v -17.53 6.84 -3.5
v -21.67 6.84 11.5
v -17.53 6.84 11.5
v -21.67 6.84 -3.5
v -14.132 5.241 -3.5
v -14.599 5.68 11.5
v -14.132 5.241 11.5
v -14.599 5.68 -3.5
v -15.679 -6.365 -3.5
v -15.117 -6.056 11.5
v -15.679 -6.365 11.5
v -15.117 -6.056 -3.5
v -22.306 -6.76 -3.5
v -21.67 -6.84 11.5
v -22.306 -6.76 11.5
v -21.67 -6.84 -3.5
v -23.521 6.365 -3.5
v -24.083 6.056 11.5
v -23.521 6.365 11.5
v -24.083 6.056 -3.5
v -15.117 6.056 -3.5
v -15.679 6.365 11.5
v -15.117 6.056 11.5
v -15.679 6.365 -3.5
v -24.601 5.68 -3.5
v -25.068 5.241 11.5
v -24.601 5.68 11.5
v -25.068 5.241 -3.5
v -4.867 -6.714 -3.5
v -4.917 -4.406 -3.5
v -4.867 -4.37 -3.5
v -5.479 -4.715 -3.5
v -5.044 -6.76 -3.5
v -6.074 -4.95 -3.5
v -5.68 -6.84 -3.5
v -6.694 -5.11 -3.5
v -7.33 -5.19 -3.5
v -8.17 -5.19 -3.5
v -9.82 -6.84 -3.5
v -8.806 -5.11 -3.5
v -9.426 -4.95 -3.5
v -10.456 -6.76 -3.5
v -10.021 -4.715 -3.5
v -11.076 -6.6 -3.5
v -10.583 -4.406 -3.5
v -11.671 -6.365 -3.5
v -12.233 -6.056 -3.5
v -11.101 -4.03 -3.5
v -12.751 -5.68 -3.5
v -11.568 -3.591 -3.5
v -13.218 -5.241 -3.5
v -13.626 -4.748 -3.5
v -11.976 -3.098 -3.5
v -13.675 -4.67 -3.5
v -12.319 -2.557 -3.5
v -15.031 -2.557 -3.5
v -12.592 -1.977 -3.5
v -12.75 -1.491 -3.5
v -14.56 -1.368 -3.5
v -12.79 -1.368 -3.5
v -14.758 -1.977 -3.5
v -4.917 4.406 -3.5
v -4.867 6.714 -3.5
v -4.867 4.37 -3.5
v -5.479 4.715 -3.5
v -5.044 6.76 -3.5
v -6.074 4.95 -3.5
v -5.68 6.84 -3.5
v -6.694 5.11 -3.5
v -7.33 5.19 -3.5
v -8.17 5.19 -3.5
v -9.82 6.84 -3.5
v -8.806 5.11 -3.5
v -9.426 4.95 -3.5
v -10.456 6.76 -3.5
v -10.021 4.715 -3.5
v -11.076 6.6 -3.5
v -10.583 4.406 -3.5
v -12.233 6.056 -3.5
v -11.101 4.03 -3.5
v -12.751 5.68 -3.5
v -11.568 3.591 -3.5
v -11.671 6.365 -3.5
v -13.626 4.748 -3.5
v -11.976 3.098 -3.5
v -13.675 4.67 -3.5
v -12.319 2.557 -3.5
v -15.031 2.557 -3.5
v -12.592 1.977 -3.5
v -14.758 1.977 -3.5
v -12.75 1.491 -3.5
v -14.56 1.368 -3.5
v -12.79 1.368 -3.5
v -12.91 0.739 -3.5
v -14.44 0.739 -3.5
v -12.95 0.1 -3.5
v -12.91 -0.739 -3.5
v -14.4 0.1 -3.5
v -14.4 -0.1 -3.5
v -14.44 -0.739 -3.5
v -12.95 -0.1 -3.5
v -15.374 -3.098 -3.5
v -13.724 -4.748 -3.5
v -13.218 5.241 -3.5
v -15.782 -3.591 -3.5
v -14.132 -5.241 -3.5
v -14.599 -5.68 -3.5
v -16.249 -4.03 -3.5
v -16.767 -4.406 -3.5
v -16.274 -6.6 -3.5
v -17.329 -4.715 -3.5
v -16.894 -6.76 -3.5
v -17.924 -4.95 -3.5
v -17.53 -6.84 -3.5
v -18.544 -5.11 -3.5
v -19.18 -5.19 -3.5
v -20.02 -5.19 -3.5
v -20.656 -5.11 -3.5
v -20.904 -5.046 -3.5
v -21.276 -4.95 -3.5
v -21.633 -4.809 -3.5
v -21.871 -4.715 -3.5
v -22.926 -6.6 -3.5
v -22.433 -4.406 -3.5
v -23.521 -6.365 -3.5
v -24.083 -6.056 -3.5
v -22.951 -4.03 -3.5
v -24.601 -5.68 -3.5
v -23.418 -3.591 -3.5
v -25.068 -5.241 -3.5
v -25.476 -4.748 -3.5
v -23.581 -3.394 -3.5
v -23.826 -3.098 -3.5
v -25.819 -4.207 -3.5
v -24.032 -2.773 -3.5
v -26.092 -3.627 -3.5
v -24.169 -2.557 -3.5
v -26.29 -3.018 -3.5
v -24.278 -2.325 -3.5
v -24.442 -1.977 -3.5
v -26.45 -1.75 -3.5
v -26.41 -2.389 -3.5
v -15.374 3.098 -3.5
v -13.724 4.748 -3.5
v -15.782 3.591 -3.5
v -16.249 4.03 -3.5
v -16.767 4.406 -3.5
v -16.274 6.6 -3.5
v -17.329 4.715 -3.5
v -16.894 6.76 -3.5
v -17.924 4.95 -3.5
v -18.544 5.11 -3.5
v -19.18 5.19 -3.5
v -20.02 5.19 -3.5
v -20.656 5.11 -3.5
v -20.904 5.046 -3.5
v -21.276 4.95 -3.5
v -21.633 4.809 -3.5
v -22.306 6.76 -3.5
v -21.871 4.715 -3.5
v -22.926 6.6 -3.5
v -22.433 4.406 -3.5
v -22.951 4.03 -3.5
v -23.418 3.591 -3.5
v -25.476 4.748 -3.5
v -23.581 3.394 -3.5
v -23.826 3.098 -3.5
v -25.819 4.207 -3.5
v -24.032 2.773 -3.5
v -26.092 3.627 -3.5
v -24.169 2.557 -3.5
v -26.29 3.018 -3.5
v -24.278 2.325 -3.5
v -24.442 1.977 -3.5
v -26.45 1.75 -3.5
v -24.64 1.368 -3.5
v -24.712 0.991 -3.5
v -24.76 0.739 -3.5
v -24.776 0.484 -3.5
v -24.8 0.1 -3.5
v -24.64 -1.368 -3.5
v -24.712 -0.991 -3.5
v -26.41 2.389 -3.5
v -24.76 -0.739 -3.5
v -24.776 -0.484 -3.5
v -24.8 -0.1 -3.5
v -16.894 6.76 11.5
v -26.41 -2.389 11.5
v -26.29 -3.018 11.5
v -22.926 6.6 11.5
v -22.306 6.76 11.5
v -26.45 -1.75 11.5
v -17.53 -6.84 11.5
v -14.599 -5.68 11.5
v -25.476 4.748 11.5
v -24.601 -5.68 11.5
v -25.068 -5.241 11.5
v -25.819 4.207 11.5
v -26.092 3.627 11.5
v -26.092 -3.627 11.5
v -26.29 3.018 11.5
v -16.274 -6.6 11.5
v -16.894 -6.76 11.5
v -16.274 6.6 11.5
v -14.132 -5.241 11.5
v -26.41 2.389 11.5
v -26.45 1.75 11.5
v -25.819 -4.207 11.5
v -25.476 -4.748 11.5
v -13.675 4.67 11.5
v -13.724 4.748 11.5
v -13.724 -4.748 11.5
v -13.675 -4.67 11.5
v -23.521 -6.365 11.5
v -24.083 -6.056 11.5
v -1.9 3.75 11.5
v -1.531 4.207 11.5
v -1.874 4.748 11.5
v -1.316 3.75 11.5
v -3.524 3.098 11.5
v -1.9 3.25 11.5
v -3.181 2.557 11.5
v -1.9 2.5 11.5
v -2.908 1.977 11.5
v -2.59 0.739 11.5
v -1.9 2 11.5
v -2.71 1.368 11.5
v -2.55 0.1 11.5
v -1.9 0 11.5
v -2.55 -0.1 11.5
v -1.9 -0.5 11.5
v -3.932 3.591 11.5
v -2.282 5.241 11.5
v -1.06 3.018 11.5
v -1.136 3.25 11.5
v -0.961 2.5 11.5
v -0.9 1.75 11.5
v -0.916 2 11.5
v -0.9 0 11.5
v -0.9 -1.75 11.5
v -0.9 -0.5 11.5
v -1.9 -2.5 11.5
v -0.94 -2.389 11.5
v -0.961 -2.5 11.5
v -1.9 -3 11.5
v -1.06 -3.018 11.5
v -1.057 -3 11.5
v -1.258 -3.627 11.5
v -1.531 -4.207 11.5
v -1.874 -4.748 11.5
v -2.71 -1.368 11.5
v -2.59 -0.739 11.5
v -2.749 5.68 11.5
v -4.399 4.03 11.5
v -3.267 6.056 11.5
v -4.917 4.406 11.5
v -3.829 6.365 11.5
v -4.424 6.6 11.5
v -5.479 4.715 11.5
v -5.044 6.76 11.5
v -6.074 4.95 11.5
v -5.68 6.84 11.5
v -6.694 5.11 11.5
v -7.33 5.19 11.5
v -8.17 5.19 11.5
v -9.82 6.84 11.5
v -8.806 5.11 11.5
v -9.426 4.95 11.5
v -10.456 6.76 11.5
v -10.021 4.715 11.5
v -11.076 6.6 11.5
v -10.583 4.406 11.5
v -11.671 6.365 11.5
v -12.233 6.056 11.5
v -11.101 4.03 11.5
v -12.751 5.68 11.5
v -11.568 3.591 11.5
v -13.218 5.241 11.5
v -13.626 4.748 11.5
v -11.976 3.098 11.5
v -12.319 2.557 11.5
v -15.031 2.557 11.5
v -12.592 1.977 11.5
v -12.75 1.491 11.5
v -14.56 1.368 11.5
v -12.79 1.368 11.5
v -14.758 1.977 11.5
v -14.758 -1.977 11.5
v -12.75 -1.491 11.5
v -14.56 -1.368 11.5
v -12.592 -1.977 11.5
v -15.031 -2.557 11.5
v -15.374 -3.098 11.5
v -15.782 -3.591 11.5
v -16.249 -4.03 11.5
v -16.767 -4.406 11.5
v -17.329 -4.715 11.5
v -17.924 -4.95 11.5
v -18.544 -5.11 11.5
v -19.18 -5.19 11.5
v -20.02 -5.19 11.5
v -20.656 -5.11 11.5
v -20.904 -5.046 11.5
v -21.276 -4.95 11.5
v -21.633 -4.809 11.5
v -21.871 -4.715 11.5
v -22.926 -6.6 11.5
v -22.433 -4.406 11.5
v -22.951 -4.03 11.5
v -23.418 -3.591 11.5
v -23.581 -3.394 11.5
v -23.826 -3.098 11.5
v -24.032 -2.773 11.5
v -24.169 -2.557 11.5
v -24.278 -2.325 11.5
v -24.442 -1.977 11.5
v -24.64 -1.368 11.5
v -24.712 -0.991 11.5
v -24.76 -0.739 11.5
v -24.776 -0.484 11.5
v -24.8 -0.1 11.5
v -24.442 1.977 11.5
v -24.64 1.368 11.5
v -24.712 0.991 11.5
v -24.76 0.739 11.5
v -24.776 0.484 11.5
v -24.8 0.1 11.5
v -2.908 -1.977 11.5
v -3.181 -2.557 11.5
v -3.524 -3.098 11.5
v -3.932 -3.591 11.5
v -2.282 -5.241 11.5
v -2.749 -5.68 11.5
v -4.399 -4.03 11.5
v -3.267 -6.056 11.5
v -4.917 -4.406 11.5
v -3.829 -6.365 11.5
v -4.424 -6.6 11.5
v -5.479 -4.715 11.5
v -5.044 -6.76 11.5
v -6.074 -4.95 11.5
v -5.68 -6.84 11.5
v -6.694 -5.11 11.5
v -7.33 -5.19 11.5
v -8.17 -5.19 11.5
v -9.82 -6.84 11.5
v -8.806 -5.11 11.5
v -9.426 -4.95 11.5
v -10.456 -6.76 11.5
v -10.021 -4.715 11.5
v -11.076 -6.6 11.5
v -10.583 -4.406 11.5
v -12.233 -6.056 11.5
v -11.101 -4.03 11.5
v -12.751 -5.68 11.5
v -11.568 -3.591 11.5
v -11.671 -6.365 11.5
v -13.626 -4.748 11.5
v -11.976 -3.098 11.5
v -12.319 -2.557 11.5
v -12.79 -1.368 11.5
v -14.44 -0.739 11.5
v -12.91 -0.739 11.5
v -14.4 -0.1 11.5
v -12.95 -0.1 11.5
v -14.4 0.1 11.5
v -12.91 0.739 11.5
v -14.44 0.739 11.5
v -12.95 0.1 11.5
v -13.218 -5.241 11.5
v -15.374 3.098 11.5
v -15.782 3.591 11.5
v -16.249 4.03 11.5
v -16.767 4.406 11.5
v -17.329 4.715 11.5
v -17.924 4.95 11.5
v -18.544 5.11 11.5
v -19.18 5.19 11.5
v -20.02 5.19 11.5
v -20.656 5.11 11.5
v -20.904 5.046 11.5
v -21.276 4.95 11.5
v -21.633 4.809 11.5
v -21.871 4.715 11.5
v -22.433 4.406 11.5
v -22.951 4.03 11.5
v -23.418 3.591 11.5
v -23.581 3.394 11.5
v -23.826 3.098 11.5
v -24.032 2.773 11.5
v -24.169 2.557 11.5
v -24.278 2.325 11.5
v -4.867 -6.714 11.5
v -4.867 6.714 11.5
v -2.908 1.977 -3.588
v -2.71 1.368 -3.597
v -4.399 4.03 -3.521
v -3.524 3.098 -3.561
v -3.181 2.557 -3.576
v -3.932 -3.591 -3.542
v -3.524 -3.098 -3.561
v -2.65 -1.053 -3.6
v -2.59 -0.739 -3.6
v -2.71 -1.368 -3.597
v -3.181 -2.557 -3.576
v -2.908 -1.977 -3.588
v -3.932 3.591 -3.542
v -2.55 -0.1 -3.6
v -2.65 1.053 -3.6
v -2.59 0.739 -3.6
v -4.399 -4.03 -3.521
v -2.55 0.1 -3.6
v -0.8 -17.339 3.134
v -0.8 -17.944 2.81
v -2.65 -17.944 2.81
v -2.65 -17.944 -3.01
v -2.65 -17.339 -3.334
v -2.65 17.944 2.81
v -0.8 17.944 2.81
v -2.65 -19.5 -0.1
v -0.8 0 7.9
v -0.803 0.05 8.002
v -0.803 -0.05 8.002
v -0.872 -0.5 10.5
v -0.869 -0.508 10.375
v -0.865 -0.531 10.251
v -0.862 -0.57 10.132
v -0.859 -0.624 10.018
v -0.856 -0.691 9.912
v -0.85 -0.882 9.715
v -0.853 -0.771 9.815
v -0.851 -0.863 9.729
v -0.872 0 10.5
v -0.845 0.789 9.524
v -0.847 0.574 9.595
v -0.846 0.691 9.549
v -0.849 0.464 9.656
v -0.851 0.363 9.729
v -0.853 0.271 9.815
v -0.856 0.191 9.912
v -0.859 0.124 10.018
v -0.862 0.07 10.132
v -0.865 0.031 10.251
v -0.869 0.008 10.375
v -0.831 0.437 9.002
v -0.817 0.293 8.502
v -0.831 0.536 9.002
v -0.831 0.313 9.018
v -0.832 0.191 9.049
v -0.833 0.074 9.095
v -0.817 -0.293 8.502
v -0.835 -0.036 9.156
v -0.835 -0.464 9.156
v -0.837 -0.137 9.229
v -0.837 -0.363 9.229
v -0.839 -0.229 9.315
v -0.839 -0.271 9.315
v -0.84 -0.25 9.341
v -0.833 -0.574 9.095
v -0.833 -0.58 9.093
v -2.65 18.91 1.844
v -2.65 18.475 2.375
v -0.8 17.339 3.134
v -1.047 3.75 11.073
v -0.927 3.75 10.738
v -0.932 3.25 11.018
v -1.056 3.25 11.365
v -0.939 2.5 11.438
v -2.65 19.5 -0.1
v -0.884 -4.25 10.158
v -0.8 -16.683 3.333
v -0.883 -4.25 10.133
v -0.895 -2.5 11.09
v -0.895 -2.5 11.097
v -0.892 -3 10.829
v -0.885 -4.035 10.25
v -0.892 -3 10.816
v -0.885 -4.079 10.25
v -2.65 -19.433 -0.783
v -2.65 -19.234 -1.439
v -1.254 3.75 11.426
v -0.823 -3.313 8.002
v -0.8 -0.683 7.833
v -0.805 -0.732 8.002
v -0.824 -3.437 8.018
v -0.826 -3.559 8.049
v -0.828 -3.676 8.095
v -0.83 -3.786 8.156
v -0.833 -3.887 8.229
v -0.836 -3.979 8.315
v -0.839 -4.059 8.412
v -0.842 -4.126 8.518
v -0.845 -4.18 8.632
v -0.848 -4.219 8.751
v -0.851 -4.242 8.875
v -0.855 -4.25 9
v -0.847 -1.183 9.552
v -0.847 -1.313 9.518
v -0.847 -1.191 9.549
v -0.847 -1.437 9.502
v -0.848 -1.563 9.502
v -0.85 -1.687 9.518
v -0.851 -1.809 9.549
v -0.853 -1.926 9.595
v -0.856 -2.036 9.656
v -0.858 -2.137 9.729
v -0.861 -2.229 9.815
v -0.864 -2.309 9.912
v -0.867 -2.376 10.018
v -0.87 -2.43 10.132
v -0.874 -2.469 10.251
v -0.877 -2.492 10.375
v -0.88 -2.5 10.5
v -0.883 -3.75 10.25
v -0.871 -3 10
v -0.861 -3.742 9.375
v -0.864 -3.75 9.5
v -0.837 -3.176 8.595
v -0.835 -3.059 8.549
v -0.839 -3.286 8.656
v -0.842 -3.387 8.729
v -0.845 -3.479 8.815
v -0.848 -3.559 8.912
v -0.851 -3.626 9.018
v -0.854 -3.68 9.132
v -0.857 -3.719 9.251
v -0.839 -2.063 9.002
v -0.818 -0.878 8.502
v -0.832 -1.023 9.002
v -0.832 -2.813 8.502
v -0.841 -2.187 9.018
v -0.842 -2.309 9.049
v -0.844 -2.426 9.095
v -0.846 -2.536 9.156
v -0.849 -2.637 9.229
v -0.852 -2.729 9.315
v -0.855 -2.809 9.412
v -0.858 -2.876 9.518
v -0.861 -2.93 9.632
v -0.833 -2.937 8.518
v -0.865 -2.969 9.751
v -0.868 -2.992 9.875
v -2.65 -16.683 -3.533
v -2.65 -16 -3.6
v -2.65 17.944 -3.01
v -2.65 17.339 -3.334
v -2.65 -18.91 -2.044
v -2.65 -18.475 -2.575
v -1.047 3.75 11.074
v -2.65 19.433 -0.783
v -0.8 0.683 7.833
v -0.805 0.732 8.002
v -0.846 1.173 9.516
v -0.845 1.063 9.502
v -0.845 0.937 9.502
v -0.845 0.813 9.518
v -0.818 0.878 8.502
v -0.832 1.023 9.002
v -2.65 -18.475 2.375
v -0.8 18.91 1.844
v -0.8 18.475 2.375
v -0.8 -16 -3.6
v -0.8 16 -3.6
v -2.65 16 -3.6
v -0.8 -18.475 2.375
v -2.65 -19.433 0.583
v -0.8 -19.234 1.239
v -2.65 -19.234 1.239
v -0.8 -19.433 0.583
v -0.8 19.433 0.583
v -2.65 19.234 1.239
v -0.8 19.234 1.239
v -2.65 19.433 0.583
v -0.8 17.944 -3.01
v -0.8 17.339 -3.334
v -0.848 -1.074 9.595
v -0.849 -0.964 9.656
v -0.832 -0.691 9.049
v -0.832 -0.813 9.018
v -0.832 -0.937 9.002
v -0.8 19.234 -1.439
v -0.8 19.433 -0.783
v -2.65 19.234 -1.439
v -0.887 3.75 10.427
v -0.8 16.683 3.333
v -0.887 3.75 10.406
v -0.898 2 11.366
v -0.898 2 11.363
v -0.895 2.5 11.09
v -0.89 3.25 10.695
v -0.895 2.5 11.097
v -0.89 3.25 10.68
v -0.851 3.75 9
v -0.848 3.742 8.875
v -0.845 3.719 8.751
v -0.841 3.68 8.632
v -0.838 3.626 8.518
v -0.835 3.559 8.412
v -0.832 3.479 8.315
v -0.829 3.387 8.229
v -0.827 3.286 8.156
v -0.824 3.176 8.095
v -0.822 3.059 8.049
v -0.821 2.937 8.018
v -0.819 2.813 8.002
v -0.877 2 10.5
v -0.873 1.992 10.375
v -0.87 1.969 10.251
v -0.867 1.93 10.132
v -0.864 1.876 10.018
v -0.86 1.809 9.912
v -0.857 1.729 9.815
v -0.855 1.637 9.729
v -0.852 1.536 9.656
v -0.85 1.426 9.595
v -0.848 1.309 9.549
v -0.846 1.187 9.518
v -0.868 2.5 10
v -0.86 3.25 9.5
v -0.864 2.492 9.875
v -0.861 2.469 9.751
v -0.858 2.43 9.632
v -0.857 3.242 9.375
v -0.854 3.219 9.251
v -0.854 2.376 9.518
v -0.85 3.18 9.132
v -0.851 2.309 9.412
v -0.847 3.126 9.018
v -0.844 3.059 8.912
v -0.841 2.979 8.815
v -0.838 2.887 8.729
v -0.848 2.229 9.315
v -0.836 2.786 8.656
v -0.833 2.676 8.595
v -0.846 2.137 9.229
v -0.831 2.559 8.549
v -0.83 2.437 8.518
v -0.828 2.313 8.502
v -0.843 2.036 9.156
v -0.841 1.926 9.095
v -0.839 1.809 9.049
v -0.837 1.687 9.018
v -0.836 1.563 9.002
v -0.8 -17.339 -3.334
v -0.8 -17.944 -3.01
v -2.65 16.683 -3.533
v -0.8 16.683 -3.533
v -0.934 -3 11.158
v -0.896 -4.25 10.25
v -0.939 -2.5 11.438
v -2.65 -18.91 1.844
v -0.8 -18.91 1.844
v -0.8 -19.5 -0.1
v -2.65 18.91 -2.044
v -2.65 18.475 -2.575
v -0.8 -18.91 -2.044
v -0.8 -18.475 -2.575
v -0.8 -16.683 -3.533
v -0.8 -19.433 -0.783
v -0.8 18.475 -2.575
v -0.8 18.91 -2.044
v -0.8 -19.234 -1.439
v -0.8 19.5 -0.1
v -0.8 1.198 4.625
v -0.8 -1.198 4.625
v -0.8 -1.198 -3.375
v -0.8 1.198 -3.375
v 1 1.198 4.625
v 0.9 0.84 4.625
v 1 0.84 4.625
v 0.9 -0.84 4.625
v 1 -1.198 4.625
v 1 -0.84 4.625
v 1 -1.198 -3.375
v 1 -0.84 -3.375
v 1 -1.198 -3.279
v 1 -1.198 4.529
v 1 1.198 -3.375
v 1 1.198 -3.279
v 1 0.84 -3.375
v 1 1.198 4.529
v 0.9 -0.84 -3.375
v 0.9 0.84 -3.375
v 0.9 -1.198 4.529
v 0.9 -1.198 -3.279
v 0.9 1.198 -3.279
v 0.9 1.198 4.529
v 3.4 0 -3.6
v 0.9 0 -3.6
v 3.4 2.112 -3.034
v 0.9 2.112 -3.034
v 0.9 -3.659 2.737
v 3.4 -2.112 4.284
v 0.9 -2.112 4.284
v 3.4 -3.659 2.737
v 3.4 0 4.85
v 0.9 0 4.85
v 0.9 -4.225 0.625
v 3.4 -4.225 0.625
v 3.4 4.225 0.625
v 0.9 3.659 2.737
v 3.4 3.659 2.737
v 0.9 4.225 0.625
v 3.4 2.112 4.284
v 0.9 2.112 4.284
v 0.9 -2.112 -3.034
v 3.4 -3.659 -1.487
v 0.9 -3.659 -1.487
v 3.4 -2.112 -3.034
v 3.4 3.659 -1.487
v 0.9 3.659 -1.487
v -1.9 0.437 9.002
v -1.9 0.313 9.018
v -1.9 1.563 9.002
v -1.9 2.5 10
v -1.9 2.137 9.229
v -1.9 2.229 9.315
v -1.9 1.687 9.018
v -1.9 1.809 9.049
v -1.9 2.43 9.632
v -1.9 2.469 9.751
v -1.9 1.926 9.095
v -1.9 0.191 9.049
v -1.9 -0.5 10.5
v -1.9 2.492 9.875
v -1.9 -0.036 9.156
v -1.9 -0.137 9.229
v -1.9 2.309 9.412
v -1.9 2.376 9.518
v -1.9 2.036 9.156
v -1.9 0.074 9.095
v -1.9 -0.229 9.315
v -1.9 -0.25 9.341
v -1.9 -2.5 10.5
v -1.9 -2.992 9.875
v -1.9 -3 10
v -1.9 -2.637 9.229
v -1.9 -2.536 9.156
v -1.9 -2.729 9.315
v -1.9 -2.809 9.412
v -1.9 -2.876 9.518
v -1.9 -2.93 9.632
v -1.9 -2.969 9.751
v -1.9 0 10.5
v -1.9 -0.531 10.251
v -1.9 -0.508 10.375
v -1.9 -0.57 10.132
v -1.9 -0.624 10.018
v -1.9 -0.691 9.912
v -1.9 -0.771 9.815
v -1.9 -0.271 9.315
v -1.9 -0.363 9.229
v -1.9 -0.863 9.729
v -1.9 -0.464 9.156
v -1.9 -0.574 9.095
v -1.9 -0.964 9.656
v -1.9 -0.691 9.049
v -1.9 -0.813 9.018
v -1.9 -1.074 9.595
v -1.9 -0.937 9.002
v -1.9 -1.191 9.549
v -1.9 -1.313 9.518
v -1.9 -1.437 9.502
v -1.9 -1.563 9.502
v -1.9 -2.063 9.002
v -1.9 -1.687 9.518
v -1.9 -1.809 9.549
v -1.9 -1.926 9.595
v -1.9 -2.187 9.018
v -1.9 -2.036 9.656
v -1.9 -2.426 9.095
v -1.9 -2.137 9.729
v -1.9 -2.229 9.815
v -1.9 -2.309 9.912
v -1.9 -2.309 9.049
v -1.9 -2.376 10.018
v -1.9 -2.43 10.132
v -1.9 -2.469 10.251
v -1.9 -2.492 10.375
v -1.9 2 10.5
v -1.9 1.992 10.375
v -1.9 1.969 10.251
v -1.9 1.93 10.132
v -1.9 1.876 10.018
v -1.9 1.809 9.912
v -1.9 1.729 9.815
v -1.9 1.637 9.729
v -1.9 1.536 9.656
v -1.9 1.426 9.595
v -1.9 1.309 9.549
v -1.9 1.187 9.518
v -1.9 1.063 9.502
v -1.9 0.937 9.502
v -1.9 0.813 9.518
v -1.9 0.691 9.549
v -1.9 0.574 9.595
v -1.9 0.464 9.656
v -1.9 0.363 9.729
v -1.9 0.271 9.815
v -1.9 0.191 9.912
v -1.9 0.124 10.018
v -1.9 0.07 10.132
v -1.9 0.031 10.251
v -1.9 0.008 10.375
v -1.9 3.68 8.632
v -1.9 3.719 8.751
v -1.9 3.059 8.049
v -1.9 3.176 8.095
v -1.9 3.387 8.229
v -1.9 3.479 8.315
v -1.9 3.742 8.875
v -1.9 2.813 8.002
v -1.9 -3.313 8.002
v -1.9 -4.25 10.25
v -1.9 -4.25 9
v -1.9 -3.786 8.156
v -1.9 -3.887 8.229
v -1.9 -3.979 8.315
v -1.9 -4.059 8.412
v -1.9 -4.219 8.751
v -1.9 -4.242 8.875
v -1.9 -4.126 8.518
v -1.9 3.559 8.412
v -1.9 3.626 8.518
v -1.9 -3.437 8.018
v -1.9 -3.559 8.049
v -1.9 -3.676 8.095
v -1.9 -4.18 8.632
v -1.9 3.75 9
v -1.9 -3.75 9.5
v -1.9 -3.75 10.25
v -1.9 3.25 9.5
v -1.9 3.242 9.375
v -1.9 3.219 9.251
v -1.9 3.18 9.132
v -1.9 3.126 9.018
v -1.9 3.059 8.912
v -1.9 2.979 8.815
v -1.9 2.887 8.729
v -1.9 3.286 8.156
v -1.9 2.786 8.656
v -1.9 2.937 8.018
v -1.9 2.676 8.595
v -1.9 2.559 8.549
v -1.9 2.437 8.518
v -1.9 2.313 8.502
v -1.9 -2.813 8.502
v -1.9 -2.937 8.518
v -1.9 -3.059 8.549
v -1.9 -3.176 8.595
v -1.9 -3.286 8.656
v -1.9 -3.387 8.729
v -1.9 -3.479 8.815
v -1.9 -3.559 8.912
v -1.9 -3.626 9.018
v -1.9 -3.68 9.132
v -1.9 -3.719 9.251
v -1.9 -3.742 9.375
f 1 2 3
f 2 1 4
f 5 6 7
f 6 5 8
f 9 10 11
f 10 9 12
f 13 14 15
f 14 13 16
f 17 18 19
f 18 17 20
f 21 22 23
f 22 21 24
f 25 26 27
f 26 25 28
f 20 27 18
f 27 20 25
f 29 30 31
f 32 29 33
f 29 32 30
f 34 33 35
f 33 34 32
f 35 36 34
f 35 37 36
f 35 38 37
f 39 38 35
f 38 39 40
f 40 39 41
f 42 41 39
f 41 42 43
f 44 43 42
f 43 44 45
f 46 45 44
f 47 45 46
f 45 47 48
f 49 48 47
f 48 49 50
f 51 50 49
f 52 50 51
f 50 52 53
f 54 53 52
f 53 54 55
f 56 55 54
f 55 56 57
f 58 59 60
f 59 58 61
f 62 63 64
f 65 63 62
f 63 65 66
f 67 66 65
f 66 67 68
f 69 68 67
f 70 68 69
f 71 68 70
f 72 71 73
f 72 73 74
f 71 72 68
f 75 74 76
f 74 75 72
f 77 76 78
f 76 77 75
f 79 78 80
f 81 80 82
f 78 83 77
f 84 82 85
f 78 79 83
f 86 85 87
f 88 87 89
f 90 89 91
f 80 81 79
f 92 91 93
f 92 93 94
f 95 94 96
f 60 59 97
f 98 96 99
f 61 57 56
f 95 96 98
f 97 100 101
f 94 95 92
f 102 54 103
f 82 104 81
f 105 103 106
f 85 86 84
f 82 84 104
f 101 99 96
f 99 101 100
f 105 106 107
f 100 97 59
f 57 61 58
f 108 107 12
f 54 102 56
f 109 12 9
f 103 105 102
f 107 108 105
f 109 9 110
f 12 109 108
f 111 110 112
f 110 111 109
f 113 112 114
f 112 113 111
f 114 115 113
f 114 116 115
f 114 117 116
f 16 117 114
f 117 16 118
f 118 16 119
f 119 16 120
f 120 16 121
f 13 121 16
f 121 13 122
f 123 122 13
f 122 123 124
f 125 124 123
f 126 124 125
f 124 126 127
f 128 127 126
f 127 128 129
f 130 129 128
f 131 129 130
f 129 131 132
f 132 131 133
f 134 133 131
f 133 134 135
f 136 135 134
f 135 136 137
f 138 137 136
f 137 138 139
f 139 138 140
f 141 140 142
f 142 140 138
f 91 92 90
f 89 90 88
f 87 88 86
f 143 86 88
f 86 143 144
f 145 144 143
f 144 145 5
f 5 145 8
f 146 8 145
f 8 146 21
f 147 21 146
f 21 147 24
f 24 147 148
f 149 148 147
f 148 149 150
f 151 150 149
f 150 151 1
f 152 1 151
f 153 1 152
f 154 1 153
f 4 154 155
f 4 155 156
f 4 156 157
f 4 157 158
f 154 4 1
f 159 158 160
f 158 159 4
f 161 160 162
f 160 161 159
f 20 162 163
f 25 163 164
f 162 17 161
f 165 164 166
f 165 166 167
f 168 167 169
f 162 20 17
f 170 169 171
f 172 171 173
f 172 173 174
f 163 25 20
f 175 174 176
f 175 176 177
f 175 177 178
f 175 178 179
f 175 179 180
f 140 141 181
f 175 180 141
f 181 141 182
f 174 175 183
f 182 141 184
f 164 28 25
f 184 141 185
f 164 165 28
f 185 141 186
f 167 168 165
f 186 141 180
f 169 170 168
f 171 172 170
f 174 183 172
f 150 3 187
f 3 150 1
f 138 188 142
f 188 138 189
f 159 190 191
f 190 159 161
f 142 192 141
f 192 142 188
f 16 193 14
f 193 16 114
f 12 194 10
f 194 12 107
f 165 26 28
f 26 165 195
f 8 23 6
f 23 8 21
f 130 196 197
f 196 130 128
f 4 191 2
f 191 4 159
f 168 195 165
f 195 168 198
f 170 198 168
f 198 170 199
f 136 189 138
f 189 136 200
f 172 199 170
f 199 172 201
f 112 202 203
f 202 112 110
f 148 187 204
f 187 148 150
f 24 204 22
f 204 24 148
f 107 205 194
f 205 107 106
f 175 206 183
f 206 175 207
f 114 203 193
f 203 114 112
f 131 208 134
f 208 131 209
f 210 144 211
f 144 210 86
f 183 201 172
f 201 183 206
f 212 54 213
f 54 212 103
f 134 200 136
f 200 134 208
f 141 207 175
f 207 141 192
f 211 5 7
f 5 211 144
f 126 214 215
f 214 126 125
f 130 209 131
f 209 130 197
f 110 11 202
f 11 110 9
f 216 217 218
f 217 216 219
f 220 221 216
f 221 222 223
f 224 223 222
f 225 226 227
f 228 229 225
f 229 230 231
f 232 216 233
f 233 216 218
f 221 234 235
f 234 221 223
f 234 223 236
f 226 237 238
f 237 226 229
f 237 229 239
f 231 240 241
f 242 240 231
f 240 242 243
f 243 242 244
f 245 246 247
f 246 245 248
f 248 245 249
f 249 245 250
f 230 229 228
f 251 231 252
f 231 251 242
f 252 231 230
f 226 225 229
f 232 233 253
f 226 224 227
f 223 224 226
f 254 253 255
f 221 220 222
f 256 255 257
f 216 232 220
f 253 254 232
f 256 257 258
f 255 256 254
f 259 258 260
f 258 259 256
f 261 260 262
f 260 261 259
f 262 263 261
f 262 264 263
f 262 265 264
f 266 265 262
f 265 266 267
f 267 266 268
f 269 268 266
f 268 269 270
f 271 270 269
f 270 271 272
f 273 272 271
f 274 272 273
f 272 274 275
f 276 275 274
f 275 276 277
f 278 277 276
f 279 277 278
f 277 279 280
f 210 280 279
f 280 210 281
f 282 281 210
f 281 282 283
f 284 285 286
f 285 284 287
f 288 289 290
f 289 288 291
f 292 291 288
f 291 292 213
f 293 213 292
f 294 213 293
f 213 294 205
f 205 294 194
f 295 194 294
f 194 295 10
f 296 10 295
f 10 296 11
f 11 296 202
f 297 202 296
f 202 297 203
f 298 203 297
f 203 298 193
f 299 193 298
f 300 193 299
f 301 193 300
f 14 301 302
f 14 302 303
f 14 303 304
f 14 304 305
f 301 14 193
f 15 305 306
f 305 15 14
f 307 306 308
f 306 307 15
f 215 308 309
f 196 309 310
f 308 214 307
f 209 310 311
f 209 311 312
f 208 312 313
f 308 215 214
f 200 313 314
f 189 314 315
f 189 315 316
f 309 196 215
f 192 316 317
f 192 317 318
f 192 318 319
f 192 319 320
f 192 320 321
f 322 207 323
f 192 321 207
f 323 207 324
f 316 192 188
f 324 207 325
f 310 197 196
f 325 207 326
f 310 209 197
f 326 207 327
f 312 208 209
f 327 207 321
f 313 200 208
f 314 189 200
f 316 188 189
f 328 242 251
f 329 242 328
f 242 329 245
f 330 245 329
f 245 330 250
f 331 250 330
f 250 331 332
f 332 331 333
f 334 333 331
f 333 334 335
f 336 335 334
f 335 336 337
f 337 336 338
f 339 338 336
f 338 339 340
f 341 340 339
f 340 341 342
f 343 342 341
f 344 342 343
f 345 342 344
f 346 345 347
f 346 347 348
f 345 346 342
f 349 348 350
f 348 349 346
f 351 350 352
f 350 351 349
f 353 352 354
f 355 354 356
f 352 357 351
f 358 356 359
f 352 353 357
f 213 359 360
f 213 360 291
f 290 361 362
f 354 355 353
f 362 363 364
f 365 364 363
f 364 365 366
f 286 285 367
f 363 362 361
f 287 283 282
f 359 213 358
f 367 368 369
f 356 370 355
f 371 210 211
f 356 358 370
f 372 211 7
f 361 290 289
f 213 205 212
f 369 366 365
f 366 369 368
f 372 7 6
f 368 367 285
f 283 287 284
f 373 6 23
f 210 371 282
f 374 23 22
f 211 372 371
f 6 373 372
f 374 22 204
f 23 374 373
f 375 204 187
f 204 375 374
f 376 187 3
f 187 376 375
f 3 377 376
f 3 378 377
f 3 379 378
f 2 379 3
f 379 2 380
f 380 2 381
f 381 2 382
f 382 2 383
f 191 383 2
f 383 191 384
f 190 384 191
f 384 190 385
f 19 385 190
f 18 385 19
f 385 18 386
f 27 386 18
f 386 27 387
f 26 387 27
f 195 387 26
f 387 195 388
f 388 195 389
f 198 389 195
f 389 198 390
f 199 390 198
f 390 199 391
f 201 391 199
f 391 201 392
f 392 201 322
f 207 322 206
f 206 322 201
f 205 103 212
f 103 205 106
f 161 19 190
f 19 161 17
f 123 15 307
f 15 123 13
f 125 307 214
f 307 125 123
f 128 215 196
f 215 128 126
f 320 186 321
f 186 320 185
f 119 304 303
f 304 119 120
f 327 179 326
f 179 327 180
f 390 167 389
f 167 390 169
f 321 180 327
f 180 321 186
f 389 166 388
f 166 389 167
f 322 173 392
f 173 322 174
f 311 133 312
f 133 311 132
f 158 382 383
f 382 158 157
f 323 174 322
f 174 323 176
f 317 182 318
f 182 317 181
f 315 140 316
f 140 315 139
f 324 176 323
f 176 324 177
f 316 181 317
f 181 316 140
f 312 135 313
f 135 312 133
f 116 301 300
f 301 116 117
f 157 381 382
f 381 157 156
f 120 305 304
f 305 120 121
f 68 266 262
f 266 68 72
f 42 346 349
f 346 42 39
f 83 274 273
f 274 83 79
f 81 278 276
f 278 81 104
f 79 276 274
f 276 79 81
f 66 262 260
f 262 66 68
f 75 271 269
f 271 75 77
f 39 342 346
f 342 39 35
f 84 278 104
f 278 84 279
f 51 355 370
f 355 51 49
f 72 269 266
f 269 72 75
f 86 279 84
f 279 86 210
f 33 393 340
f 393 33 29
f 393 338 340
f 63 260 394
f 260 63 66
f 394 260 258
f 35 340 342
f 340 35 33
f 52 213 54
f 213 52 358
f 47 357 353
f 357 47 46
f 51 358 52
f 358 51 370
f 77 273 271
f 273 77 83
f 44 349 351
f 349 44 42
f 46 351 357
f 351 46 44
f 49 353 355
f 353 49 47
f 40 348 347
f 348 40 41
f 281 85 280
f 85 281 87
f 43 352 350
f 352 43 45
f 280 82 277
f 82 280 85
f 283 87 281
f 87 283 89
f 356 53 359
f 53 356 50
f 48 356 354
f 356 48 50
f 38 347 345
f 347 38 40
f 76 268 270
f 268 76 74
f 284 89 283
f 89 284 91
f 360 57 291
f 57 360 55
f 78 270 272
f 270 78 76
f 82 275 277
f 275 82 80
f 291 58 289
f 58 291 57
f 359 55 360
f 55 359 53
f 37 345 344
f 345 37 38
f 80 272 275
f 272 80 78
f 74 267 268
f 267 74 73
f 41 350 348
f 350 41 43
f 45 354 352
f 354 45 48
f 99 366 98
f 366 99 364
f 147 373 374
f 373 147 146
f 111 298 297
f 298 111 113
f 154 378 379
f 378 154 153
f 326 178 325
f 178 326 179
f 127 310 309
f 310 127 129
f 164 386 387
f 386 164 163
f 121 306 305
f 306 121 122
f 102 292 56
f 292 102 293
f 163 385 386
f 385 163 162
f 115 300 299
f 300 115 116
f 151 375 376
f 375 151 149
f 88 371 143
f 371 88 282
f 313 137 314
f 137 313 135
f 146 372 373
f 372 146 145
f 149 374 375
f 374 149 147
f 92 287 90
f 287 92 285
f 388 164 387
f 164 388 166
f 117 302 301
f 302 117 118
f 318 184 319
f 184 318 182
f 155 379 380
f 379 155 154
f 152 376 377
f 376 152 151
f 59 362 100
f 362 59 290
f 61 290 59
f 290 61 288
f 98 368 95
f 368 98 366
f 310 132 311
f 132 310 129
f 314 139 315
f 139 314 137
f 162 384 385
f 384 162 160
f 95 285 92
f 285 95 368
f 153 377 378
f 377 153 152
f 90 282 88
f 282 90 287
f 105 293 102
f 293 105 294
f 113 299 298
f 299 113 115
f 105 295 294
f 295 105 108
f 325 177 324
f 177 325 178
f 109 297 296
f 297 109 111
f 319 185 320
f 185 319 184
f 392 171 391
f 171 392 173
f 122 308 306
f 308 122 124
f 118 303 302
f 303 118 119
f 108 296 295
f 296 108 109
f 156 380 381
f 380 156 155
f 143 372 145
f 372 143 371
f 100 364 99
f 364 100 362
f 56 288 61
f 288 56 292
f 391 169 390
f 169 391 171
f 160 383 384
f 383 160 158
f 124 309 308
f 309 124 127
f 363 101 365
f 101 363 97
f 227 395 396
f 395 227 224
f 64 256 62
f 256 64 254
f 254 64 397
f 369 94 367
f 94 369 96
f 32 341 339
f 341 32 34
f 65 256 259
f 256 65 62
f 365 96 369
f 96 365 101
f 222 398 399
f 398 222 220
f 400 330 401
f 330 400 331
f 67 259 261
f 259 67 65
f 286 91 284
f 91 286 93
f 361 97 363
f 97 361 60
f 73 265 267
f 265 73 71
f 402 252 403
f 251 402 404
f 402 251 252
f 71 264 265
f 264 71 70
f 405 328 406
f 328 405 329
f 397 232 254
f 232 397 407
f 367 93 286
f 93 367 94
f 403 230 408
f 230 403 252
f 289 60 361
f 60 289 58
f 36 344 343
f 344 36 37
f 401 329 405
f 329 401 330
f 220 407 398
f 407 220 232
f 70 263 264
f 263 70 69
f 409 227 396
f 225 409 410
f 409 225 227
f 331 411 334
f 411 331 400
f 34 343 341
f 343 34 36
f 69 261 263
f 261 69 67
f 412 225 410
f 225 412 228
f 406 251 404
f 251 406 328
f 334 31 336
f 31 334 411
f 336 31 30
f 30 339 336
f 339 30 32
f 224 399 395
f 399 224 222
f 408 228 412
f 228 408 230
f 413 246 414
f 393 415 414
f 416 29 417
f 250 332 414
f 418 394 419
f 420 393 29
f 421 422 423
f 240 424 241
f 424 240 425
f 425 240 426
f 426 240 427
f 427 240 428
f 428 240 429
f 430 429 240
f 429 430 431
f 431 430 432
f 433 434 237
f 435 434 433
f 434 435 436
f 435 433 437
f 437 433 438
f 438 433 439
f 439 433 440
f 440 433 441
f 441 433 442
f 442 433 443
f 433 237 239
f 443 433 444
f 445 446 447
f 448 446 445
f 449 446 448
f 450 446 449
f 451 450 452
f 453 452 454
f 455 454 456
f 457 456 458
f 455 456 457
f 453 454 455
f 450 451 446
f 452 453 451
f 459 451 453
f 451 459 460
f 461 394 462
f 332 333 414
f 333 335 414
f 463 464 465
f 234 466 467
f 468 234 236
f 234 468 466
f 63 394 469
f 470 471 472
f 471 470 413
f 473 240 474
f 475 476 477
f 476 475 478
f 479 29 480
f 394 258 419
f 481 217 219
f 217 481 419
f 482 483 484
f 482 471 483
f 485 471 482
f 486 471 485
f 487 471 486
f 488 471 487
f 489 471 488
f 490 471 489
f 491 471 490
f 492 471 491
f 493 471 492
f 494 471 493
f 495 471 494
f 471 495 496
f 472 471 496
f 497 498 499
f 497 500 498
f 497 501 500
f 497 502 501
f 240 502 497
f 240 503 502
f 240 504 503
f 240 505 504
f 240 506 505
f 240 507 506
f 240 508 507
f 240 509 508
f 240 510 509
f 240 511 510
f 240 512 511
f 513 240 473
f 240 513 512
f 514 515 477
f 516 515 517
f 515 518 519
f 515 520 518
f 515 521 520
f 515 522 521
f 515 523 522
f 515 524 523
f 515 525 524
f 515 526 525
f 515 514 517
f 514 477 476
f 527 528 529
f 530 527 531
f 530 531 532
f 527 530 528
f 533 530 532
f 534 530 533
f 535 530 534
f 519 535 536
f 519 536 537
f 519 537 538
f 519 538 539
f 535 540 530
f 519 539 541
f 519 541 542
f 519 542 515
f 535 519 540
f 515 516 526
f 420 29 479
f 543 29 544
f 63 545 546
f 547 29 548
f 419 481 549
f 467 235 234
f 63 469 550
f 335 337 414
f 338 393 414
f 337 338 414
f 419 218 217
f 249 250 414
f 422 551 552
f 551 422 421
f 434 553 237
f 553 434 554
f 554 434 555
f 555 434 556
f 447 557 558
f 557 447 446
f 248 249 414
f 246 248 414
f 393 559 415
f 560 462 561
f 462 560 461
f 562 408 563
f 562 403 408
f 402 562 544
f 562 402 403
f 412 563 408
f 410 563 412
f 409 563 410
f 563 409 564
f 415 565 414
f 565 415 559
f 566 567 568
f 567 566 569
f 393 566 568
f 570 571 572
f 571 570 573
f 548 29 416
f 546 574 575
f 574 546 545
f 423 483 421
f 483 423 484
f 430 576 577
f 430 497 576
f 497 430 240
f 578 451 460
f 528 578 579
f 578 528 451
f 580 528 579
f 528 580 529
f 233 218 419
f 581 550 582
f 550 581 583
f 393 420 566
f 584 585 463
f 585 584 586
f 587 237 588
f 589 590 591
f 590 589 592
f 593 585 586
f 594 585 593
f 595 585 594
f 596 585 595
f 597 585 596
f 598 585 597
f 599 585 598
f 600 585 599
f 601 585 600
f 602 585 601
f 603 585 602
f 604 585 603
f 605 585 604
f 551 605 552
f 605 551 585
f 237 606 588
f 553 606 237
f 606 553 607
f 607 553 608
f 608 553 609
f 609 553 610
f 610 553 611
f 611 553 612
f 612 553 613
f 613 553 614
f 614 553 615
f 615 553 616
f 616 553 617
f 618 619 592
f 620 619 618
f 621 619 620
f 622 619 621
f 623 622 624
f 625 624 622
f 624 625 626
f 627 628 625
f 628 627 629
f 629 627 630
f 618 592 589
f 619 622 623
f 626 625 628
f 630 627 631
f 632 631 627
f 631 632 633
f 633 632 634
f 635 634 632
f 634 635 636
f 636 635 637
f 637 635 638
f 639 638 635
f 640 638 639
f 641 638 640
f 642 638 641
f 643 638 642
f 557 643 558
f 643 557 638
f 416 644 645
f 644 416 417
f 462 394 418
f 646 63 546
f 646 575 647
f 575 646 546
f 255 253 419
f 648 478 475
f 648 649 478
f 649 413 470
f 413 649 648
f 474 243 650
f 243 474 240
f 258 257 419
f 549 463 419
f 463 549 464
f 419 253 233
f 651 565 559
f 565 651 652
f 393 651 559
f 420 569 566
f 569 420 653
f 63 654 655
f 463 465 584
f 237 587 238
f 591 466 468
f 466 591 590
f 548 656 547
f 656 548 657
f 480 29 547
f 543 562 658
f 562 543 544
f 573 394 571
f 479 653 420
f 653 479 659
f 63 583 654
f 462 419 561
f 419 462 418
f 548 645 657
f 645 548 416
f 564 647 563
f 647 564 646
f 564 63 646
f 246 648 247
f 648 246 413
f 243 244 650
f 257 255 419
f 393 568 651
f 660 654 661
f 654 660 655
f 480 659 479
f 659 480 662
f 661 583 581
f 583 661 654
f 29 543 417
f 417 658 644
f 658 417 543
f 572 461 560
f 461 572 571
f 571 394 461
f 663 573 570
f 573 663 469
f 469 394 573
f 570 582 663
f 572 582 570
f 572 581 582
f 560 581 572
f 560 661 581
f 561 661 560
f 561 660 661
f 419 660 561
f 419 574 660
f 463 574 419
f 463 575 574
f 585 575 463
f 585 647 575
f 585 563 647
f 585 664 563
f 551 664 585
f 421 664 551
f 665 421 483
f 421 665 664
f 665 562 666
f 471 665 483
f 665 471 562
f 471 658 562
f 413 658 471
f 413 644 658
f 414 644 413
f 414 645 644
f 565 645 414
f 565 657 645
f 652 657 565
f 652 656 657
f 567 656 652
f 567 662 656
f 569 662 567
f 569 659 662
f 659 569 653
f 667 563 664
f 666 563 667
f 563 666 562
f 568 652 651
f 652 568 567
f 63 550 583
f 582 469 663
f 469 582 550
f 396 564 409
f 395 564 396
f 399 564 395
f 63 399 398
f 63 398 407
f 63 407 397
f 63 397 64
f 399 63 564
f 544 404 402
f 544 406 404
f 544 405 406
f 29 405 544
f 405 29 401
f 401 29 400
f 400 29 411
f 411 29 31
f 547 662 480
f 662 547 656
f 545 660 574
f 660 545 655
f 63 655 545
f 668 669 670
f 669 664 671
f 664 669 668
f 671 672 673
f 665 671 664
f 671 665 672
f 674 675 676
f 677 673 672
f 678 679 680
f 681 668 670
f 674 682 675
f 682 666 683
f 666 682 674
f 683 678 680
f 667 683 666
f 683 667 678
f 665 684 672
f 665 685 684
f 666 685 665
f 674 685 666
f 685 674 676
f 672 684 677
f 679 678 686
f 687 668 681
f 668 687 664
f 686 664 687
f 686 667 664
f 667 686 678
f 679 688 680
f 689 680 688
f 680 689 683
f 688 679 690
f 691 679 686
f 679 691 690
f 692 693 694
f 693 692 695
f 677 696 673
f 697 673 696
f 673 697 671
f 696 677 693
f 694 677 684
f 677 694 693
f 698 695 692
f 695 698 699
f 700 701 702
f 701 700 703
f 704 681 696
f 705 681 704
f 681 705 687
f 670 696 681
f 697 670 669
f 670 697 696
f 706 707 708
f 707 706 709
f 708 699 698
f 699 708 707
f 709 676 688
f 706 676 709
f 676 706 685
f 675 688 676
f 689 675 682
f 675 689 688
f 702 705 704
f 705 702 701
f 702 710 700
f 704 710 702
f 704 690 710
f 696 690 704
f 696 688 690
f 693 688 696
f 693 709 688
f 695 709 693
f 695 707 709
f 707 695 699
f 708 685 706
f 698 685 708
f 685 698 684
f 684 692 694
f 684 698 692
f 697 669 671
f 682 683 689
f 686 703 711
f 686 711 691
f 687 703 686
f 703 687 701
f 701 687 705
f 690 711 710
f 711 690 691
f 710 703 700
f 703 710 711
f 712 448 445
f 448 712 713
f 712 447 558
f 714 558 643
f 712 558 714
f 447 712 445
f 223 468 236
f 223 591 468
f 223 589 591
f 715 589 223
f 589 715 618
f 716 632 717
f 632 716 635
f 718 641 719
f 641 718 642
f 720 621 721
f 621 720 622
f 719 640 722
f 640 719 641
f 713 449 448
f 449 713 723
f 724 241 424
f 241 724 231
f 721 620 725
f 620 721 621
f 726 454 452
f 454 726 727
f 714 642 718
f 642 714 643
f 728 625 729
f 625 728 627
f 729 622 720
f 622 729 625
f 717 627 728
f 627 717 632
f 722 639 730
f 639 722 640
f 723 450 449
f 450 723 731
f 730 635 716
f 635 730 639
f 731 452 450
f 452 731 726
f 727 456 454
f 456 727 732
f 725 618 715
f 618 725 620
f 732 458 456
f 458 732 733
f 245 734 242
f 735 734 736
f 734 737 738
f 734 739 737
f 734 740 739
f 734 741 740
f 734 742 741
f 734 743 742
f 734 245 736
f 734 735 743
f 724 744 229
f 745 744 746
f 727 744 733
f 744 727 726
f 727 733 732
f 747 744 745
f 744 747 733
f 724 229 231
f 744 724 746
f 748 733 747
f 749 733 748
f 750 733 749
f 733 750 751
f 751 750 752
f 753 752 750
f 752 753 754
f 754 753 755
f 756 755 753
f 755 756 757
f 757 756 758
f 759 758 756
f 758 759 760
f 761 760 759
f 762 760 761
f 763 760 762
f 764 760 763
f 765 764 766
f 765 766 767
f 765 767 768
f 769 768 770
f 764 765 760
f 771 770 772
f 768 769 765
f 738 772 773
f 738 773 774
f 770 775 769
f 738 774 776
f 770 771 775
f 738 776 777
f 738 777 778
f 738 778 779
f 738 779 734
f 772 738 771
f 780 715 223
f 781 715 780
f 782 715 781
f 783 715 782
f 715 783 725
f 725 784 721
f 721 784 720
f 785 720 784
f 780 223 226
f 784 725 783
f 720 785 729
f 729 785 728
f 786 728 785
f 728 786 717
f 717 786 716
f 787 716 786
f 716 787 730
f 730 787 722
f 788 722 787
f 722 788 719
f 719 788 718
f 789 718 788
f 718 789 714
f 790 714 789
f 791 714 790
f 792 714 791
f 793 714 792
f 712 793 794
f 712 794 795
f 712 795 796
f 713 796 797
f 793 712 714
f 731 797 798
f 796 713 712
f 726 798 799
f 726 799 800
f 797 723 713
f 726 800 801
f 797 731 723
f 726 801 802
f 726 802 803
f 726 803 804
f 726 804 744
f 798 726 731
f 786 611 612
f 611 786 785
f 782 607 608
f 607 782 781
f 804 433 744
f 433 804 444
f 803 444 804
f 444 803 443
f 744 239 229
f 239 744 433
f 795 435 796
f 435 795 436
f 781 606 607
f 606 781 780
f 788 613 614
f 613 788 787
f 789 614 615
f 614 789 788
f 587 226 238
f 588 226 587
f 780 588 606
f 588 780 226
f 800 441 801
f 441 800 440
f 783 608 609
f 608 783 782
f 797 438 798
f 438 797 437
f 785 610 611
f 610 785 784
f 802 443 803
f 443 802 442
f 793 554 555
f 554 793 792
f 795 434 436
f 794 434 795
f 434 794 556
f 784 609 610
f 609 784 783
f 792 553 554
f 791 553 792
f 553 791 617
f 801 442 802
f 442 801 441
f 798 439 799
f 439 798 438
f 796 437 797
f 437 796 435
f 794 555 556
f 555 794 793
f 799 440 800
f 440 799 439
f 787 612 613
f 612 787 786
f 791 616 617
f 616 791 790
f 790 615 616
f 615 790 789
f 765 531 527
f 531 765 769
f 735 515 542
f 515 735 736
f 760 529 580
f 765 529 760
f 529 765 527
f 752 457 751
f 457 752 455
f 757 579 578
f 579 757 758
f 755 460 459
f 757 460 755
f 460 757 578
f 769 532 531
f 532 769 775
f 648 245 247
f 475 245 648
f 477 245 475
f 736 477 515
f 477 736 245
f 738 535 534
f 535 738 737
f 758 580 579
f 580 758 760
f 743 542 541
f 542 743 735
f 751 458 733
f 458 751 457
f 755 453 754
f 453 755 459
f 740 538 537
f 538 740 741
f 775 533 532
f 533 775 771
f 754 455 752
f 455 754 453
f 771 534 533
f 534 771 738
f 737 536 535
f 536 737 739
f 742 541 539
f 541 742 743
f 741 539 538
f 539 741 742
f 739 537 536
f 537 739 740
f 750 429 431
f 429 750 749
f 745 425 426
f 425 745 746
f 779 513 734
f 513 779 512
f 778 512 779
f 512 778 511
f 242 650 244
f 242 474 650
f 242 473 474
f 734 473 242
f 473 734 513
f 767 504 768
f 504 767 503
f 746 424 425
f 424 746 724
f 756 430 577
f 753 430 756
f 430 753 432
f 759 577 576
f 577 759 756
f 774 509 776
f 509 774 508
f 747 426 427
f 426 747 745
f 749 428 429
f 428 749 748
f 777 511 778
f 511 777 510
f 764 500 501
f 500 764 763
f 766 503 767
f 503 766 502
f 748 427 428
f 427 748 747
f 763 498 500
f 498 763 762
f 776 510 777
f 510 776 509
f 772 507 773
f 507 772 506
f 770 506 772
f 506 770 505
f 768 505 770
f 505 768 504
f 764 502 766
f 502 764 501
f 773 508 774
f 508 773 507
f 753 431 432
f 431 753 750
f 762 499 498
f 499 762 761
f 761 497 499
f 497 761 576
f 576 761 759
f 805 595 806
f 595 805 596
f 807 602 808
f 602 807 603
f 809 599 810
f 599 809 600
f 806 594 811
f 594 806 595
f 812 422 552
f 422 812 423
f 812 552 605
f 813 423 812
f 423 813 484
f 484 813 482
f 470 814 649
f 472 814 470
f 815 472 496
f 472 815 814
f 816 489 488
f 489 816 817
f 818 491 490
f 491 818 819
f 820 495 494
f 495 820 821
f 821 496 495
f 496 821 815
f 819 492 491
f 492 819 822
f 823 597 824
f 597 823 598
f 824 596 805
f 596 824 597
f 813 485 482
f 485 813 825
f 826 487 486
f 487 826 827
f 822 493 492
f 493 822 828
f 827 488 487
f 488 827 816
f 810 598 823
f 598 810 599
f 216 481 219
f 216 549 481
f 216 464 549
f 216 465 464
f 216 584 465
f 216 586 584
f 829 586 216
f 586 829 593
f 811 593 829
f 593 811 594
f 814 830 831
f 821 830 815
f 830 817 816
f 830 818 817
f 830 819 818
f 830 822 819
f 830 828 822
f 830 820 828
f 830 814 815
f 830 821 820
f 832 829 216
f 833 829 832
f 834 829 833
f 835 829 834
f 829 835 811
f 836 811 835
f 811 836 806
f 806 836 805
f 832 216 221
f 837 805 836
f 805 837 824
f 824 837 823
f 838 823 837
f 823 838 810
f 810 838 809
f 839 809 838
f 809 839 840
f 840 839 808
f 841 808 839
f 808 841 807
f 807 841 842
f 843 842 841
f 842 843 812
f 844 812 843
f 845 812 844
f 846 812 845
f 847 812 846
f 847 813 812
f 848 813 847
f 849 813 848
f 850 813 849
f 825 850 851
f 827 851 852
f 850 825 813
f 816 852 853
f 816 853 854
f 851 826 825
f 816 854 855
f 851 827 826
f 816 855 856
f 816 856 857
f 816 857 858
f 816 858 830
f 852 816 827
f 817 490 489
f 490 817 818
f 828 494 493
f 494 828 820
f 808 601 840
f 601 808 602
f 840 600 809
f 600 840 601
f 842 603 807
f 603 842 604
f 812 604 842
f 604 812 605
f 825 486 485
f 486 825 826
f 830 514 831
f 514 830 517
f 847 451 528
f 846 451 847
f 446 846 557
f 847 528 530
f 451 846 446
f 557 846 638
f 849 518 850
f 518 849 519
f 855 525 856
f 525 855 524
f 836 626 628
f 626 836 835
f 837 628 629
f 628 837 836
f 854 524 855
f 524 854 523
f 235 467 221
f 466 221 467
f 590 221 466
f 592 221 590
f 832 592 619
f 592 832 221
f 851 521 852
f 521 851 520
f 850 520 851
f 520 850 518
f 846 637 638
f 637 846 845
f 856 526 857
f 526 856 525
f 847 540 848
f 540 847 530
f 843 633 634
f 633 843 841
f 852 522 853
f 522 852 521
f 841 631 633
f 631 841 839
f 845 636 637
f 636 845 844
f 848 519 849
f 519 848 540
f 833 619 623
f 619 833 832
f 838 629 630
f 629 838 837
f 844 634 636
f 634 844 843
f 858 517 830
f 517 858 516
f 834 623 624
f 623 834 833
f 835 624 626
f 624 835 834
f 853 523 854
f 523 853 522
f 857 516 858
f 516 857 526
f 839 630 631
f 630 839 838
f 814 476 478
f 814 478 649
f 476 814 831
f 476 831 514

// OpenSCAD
// PEGSTR - Pegboard Wizard
// Design by Marius Gheorghescu, November 2014
// Update log:
// November 9th 2014
//		- first coomplete version. Angled holders are often odd/incorrect.
// November 15th 2014
//		- minor tweaks to increase rendering speed. added logo. 
// November 28th 2014
//		- bug fixes
// March 2020
//      - compatibility with Euro pegboards

// preview[view:north, tilt:bottom diagonal]

// width of the orifice
holder_x_size = 10.0;

// depth of the orifice
holder_y_size = 10.0;

// hight of the holder
holder_height = 15;

// how thick are the walls. Hint: 6*extrusion width produces the best results.
wall_thickness = 1.85;

// how many times to repeat the holder on X axis
holder_x_count = 1;

// how many times to repeat the holder on Y axis
holder_y_count = 2;

// orifice corner radius (roundness). Needs to be less than min(x,y)/2.
corner_radius = 30;

// Use values less than 1.0 to make the bottom of the holder narrow
taper_ratio = 1.0;


/* [Advanced] */

// offset from the peg board, typically 0 unless you have an object that needs clearance
holder_offset = 0.0;

// what ratio of the holders bottom is reinforced to the plate [0.0-1.0]
strength_factor = 0.1;

// number of horizontal rows of pins, should be 1 or more.
min_pin_z_count=1;

// for bins: what ratio of wall thickness to use for closing the bottom
closed_bottom = 0.0;

// what percentage cu cut in the front (example to slip in a cable or make the tool snap from the side)
holder_cutout_side = 0.0;

// set an angle for the holder to prevent object from sliding or to view it better from the top
holder_angle = 0.0;

// Generate 'legs'. Early implementation, doesn't work for every combination. Currently only works with 2 pin z count. Placement not testet and maybe needs finde tuning.
generate_legs = 0;


/* [Hidden] */

// what is the $fn parameter
holder_sides = max(50, min(20, holder_x_size*2));

// dimensions EU Pegboard
hole_spacing_z = 25;
hole_spacing_x = 37.5;

hole_size_x = 7;
hole_size_z = 4.5;
board_thickness = 1.8;

// TODO check this!!!
edge_size = 8.45;
edge_thickness = 2.5;
min_width_for_single_height = 32;

holder_total_y = wall_thickness + holder_y_count*(wall_thickness+holder_y_size);
holder_total_temp_x = wall_thickness + holder_x_count*(wall_thickness+holder_x_size);
holder_total_z = max(holder_height, (min_pin_z_count-1) * hole_spacing_z);
holder_roundness = min(corner_radius, holder_x_size/2, holder_y_size/2); 

pin_z_count = max(holder_height / hole_spacing_z, min_pin_z_count);

holder_total_x = pin_z_count == 1 ? max(min_width_for_single_height, holder_total_temp_x) : holder_total_temp_x;

pin_x_count = floor(holder_total_x/hole_spacing_x) + 1;


// what is the $fn parameter for holders
fn = 32;

epsilon = 0.1;

$fn = fn;

module round_rect_ex(x1, y1, x2, y2, z, r1, r2)
{
	$fn=holder_sides;
	brim = z/10;

	hull() {
        translate([-x1/2 + r1, y1/2 - r1, z/2-brim/2])
            cylinder(r=r1, h=brim,center=true);
        translate([x1/2 - r1, y1/2 - r1, z/2-brim/2])
            cylinder(r=r1, h=brim,center=true);
        translate([-x1/2 + r1, -y1/2 + r1, z/2-brim/2])
            cylinder(r=r1, h=brim,center=true);
        translate([x1/2 - r1, -y1/2 + r1, z/2-brim/2])
            cylinder(r=r1, h=brim,center=true);

        translate([-x2/2 + r2, y2/2 - r2, -z/2+brim/2])
            cylinder(r=r2, h=brim,center=true);
        translate([x2/2 - r2, y2/2 - r2, -z/2+brim/2])
            cylinder(r=r2, h=brim,center=true);
        translate([-x2/2 + r2, -y2/2 + r2, -z/2+brim/2])
            cylinder(r=r2, h=brim,center=true);
        translate([x2/2 - r2, -y2/2 + r2, -z/2+brim/2])
            cylinder(r=r2, h=brim,center=true);

    }
}

module pin(clipX, clipY, firstX, lastX, lastZ)
{        
	if (clipX && clipY) {
        scale([1.0,hole_size_z/edge_size,1.0])
		cube([8,4.5,2], true);
        //translate([2.5,0,0])
        //cylinder(1,0.8,0.8, center = true);
          intersection() {
			translate([0, 0, board_thickness / 2])
                cylinder(d=edge_size, h=edge_thickness, center=false, $fn=12);
        }
        if (generate_legs == 1) {
         if (lastZ && firstX) {
            translate([7.5,-12,0])
            cylinder(h=2.5, r=2.2, center=true);
            translate([-25,-14.4,-2])
            cube([35,4.8,1], center = false);   
         } 
         if (lastZ && lastX) {
            translate([7.5,12,0])
            cylinder(h=2.5, r=2.2, center=true);
            translate([-25,9.4,-2])
            cube([35,4.8,1], center = false);                        
         }
     }
      
	} else if ((clipX || clipY) && false) {
        vertical = holder_total_z > holder_total_z;
        x = vertical ? 3 : hole_size_x * 0.85;
        y = vertical ? hole_size_x * 0.85 : 3;
        translate([0,0,-board_thickness / 2 + 0.4])
            scale([1.0,y/x,1.0])
            cylinder(d= hole_size_x*0.85, h = 0.8, center=true);
    }
}

module pinboard_clips() 
{
	rotate([0,90,0]){        
        xTempCount = floor(holder_total_x/(hole_spacing_x / 3));
        xCount = xTempCount % 3 == 1 ? xTempCount - 1 : (xTempCount% 3 == 3 ? xTempCount - 1 : xTempCount);
        zCount = pin_z_count * 2 - 2;
        
        for(x=[0:xCount]) {
            for(z=[0:zCount]) {
                
                rowIsEven = z % 2 == 0;
                firstItem = x == 0;
                lastItem = x == xCount - 1;
                firstRow = z == 0;
                skipWhen = !firstRow && rowIsEven && (firstItem || lastItem) && (firstItem && lastItem);
                
                if (!skipWhen) {                
       translate([
                        z * hole_spacing_z/2 + (hole_size_x - hole_size_z)/4, 
                        -(hole_spacing_x/3) * xCount/2 + (x * hole_spacing_x/3), 
                        0])

                            pin(z % 2 == 0, (
                    (x % 3 == 1 && xCount % 3 != 0) ||
                    (xCount % 3 == 0 && x % 3 == 0)),
                    x == 1 || x == 0, 
                    x == xTempCount -1, 
                    z == zCount);
                }                          
            }
        }
    }
}

module pinboard()
{
        
	rotate([0,90,0])
	translate([-epsilon, 0, -wall_thickness - board_thickness/2 + epsilon])
	hull() {
		translate([0, 
			-holder_total_x/2,0])
			cylinder(r=hole_size_x/2, h=wall_thickness);

		translate([0, 
			holder_total_x/2,0])
			cylinder(r=hole_size_x/2,  h=wall_thickness);

		translate([max(strength_factor, pin_z_count - 1)*hole_spacing_z + 2,
			-hole_spacing_x*((pin_x_count-1)/2),0])
			cylinder(r=hole_size_x/2, h=wall_thickness);

		translate([max(strength_factor, pin_z_count - 1)*hole_spacing_z + 2,
			hole_spacing_x*((pin_x_count-1)/2),0])
			cylinder(r=hole_size_x/2,  h=wall_thickness);

	}
}

module holder(negative)
{
    delta_x = max(0, holder_total_x-(holder_x_count * (holder_x_size + 2*wall_thickness))) / 2;
    
	for(x=[1:holder_x_count]){
		for(y=[1:holder_y_count]) 
		render(convexity=2) {
			translate([
				-holder_total_y /*- (holder_y_size+wall_thickness)/2*/ + y*(holder_y_size+wall_thickness) + wall_thickness,

				delta_x - holder_total_x/2 + (holder_x_size+wall_thickness)/2 + (x-1)*(holder_x_size+wall_thickness) + wall_thickness/2,
				 0])			
	{
		rotate([0, holder_angle, 0])
		translate([
			-wall_thickness*abs(sin(holder_angle))-0*abs((holder_y_size/2)*sin(holder_angle))-holder_offset-(holder_y_size + 2*wall_thickness)/2 - board_thickness/2,
			0,
			-(holder_height/2)*sin(holder_angle) - holder_height/2 + hole_size_x/2
		])
		difference() {
			if (!negative)

				round_rect_ex(
					(holder_y_size + 2*wall_thickness), 
					holder_x_size + 2*wall_thickness, 
					(holder_y_size + 2*wall_thickness)*taper_ratio, 
					(holder_x_size + 2*wall_thickness)*taper_ratio, 
					holder_height, 
					holder_roundness + epsilon, 
					holder_roundness*taper_ratio + epsilon);

				translate([0,0,closed_bottom*wall_thickness])

				if (negative>1) {
					round_rect_ex(
						holder_y_size*taper_ratio, 
						holder_x_size*taper_ratio, 
						holder_y_size*taper_ratio, 
						holder_x_size*taper_ratio, 
						3*max(holder_height, hole_spacing_z),
						holder_roundness*taper_ratio + epsilon, 
						holder_roundness*taper_ratio + epsilon);
				} else {
					round_rect_ex(
						holder_y_size, 
						holder_x_size, 
						holder_y_size*taper_ratio, 
						holder_x_size*taper_ratio, 
						holder_height+2*epsilon,
						holder_roundness + epsilon, 
						holder_roundness*taper_ratio + epsilon);
				}

			if (!negative)
				if (holder_cutout_side > 0) {

				if (negative>1) {
					hull() {
						scale([1.0, holder_cutout_side, 1.0])
		 					round_rect_ex(
							holder_y_size*taper_ratio, 
							holder_x_size*taper_ratio, 
							holder_y_size*taper_ratio, 
							holder_x_size*taper_ratio, 
							3*max(holder_height, hole_spacing_z),
							holder_roundness*taper_ratio + epsilon, 
							holder_roundness*taper_ratio + epsilon);
		
						translate([0-(holder_y_size + 2*wall_thickness), 0,0])
						scale([1.0, holder_cutout_side, 1.0])
		 					round_rect_ex(
							holder_y_size*taper_ratio, 
							holder_x_size*taper_ratio, 
							holder_y_size*taper_ratio, 
							holder_x_size*taper_ratio, 
							3*max(holder_height, hole_spacing_z),
							holder_roundness*taper_ratio + epsilon, 
							holder_roundness*taper_ratio + epsilon);
					}
				} else {
					hull() {
						scale([1.0, holder_cutout_side, 1.0])
		 					round_rect_ex(
							holder_y_size, 
							holder_x_size, 
							holder_y_size*taper_ratio, 
							holder_x_size*taper_ratio, 
							holder_height+2*epsilon,
							holder_roundness + epsilon, 
							holder_roundness*taper_ratio + epsilon);
		
						translate([0-(holder_y_size + 2*wall_thickness), 0,0])
						scale([1.0, holder_cutout_side, 1.0])
		 					round_rect_ex(
							holder_y_size, 
							holder_x_size, 
							holder_y_size*taper_ratio, 
							holder_x_size*taper_ratio, 
							holder_height+2*epsilon,
							holder_roundness + epsilon, 
							holder_roundness*taper_ratio + epsilon);
						}
					}

				}
			}
		} // positioning
	} // for y
	} // for X
}


module pegstr() 
{
	difference() {
		union() {

			pinboard();


			difference() {
				hull() {
					pinboard();
	
					intersection() {
						translate([-holder_offset - (strength_factor-0.5)*holder_total_y - wall_thickness/4,0,0])
						cube([
							holder_total_y + 2*wall_thickness, 
							holder_total_x + wall_thickness, 
							2*holder_height
						], center=true);
	
						holder(0);
	
					}	
				}

				if (closed_bottom*wall_thickness < epsilon) {
						holder(2);
				}

			}

			color([0.7,0,0])
			difference() {
				holder(0);
				holder(2);
			}

			color([1,0,0])
				pinboard_clips();
		}
	
		holder(1);

		translate([-board_thickness/2,-1,-hole_size_x*2]) 
		rotate([-90,0,90]) {
			intersection() {
				union() {
					difference() {
						round_rect_ex(3, 10, 3, 10, 2, 1, 1);
						round_rect_ex(2, 9, 2, 9, 3, 1, 1);
					}
			
					translate([2.5, 0, 0]) 
						difference() {
							round_rect_ex(3, 10, 3, 10, 2, 1, 1);
							round_rect_ex(2, 9, 2, 9, 3, 1, 1);
						}
				}
			
				translate([0, -3.5, 0]) 
					cube([20,4,10], center=true);
			}
		
			translate([1.25, -2.5, 0]) 
				difference() {
					round_rect_ex(8, 7, 8, 7, 2, 1, 1);
					round_rect_ex(7, 6, 7, 6, 3, 1, 1);
		
					translate([3,0,0])
						cube([4,2.5,3], center=true);
				}
		
		
			translate([2.0, -1.0, 0]) 
				cube([8, 0.5, 2], center=true);
		
			translate([0,-2,0])
				cylinder(r=0.25, h=2, center=true, $fn=12);
		
			translate([2.5,-2,0])
				cylinder(r=0.25, h=2, center=true, $fn=12);
		}

	}
}


rotate([180,0,0]) pegstr();

module roundedcube(size = [1, 1, 1], center = false, radius = 0.5, apply_to = "all") {
	// If single value, convert to [x, y, z] vector
	size = (size[0] == undef) ? [size, size, size] : size;

	translate_min = radius;
	translate_xmax = size[0] - radius;
	translate_ymax = size[1] - radius;
	translate_zmax = size[2] - radius;

	diameter = radius * 2;

	module build_point(type = "sphere", rotate = [0, 0, 0]) {
		if (type == "sphere") {
			sphere(r = radius);
		} else if (type == "cylinder") {
			rotate(a = rotate)
			cylinder(h = diameter, r = radius, center = true);
		}
	}

	obj_translate = (center == false) ?
		[0, 0, 0] : [
			-(size[0] / 2),
			-(size[1] / 2),
			-(size[2] / 2)
		];

	translate(v = obj_translate) {
		hull() {
			for (translate_x = [translate_min, translate_xmax]) {
				x_at = (translate_x == translate_min) ? "min" : "max";
				for (translate_y = [translate_min, translate_ymax]) {
					y_at = (translate_y == translate_min) ? "min" : "max";
					for (translate_z = [translate_min, translate_zmax]) {
						z_at = (translate_z == translate_min) ? "min" : "max";

						translate(v = [translate_x, translate_y, translate_z])
						if (
							(apply_to == "all") ||
							(apply_to == "xmin" && x_at == "min") || (apply_to == "xmax" && x_at == "max") ||
							(apply_to == "ymin" && y_at == "min") || (apply_to == "ymax" && y_at == "max") ||
							(apply_to == "zmin" && z_at == "min") || (apply_to == "zmax" && z_at == "max")
						) {
							build_point("sphere");
						} else {
							rotate = 
								(apply_to == "xmin" || apply_to == "xmax" || apply_to == "x") ? [0, 90, 0] : (
								(apply_to == "ymin" || apply_to == "ymax" || apply_to == "y") ? [90, 90, 0] :
								[0, 0, 0]
							);
							build_point("cylinder", rotate);
						}
					}
				}
			}
		}
	}
}
